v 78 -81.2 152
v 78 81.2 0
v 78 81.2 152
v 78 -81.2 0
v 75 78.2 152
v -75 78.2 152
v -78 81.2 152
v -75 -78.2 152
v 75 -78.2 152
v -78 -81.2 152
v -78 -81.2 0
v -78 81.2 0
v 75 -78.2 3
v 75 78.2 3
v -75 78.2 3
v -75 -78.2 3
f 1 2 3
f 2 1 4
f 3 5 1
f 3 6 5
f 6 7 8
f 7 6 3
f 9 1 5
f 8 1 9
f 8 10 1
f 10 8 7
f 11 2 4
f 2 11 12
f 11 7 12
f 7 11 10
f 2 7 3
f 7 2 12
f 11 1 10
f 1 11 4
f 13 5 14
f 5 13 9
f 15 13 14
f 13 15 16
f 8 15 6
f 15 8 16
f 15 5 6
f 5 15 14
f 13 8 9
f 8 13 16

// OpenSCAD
// file: ../01_bandeja/ribs.scad
//
// ============================================================================
// SteamMachine UM790
// Project Phoenix
//
// Archivo : ribs.scad
// Versión : 8.0
//
// Nervios estructurales de la bandeja.
//
// ============================================================================

include <../../../00_parametros.scad>;

$fn = 64;


//=============================================================================
// NERVIO ENTRE DOS PUNTOS
//=============================================================================

module rib(x1, y1, x2, y2)
{

    dx = x2 - x1;
    dy = y2 - y1;

    len = sqrt(dx*dx + dy*dy);

    angle = atan2(dy, dx);

    translate([x1, y1, tray_thickness])

        rotate([0,0,angle])

            cube(
            [
                len,
                rib_width,
                rib_height
            ]);

}


//=============================================================================
// NERVIOS
//=============================================================================

module ribs()
{

    //---------------------------------------------------------
    // Horizontal superior
    //---------------------------------------------------------

    rib(
        -off_x,
         off_y-rib_width/2,

         off_x,
         off_y-rib_width/2
    );


    //---------------------------------------------------------
    // Horizontal inferior
    //---------------------------------------------------------

    rib(
        -off_x,
        -off_y-rib_width/2,

         off_x,
        -off_y-rib_width/2
    );


    //---------------------------------------------------------
    // Vertical izquierdo
    //---------------------------------------------------------

    translate([-rib_width/2,0,0])

    rib(
        -off_x,
        -off_y,

        -off_x,
         off_y
    );


    //---------------------------------------------------------
    // Vertical derecho
    //---------------------------------------------------------

    translate([-rib_width/2,0,0])

    rib(
         off_x,
        -off_y,

         off_x,
         off_y
    );


    //---------------------------------------------------------
    // Cruz central horizontal
    //---------------------------------------------------------

    rib(
        -off_x,
        -rib_width/2,

         off_x,
        -rib_width/2
    );


    //---------------------------------------------------------
    // Cruz central vertical
    //---------------------------------------------------------

    translate([-rib_width/2,0,0])

    rib(
        0,
        -off_y,

        0,
         off_y
    );

}


//=============================================================================
// PREVIEW
//=============================================================================

color("RoyalBlue")
ribs();
// file: ../01_bandeja/posts.scad
//
// ============================================================================
// SteamMachine UM790
// Project Phoenix
//
// Archivo : posts.scad
// Versión : 8.0
//
// Postes de fijación UM790 Pro.
//
// ============================================================================

include <../../../00_parametros.scad>;

$fn = 64;


//=============================================================================
// POSTE M3
//=============================================================================

module post()
{

    difference()
    {

        //---------------------------------------------------------------------
        // Cuerpo del poste
        //---------------------------------------------------------------------

        cylinder(
            h = um790_post_height,
            d = um790_post_diameter
        );

        //---------------------------------------------------------------------
        // Alojamiento del inserto M3
        //---------------------------------------------------------------------

        translate([0,0,um790_post_height-insert_depth])

            cylinder(
                h = insert_depth + 0.10,
                d = insert_diameter
            );

    }

}


//=============================================================================
// CONJUNTO DE POSTES
//=============================================================================

module posts()
{

    translate([ off_x,  off_y, 0]) post();

    translate([-off_x,  off_y, 0]) post();

    translate([-off_x, -off_y, 0]) post();

    translate([ off_x, -off_y, 0]) post();

}


//=============================================================================
// PREVIEW
//=============================================================================

color("Orange")
posts();
// file: ../01_bandeja/base.scad
//
// ============================================================================
// SteamMachine UM790
// Project Phoenix
//
// Archivo : base.scad
// Versión : 8.0
//
// Base estructural de la bandeja.
//
// ============================================================================

include <../../../00_parametros.scad>;

$fn = 64;

//=============================================================================
// BASE
//=============================================================================

module base()
{

    union()
    {

        //---------------------------------------------------------------------
        // Marco exterior
        //---------------------------------------------------------------------

        difference()
        {

            translate([
                -tray_width/2,
                -tray_depth/2,
                0
            ])
            cube([
                tray_width,
                tray_depth,
                tray_thickness
            ]);


            translate([
                -(tray_width-2*base_frame_width)/2,
                -(tray_depth-2*base_frame_width)/2,
                -0.1
            ])
            cube([
                tray_width-2*base_frame_width,
                tray_depth-2*base_frame_width,
                tray_thickness+0.2
            ]);

        }


        //---------------------------------------------------------------------
        // Islas de apoyo de los postes
        //---------------------------------------------------------------------

        for(ix=[-1,1])
        for(iy=[-1,1])
        {

            translate([
                ix*off_x-base_island_size/2,
                iy*off_y-base_island_size/2,
                0
            ])
            cube([
                base_island_size,
                base_island_size,
                tray_thickness
            ]);

        }


        //---------------------------------------------------------------------
        // Refuerzo horizontal
        //---------------------------------------------------------------------

        translate([
            -off_x,
            -base_bridge_width/2,
            0
        ])
        cube([
            off_x*2,
            base_bridge_width,
            tray_thickness
        ]);


        //---------------------------------------------------------------------
        // Refuerzo vertical
        //---------------------------------------------------------------------

        translate([
            -base_bridge_width/2,
            -off_y,
            0
        ])
        cube([
            base_bridge_width,
            off_y*2,
            tray_thickness
        ]);

    }

}


//=============================================================================
// PREVIEW
//=============================================================================

color("Gainsboro")
    base();
// file: ../01_bandeja/tray.scad
//
// ============================================================================
// SteamMachine UM790
// Project Phoenix
//
// Archivo : tray.scad
// Versión : 8.0
//
// Ensamblaje completo de la bandeja estructural.
//
// ============================================================================

include <../../../00_parametros.scad>;

use <base.scad>;
use <posts.scad>;
use <ribs.scad>;

$fn = 64;


//=============================================================================
// BANDEJA COMPLETA
//=============================================================================

module tray()
{

    union()
    {

        //---------------------------------------------------------------------
        // Base
        //---------------------------------------------------------------------

        base();


        //---------------------------------------------------------------------
        // Postes
        //---------------------------------------------------------------------

        translate([0,0,tray_thickness])
            posts();


        //---------------------------------------------------------------------
        // Nervios
        //---------------------------------------------------------------------

        ribs();

    }

}


//=============================================================================
// PREVIEW
//=============================================================================

color("LightGray")
    tray();
// file: ../../../00_parametros.scad
//
// ============================================================================
// SteamMachine UM790
// Project Phoenix
//
// Archivo : 00_parametros.scad
// Versión : 2.1
//
// ÚNICA fuente de parámetros del proyecto.
//
// NO añadir parámetros duplicados en otros archivos.
//
// ============================================================================

$fn = 64;

//=============================================================================
// INFORMACIÓN
//=============================================================================

project_name    = "SteamMachine UM790";
project_version = "2.1";


//=============================================================================
// CARCASA
//=============================================================================

case_width  = 156.0;
case_depth  = 162.4;
case_height = 152.0;

wall_thickness   = 3.0;
top_thickness    = 3.0;
bottom_thickness = 3.0;


//=============================================================================
// BANDEJA
//=============================================================================

tray_width      = 150.0;
tray_depth      = 150.0;
tray_thickness  = 3.0;

base_frame_width    = 10.0;

base_outer_chamfer  = 4.0;
base_inner_chamfer  = 4.0;


//=============================================================================
// REFUERZOS BASE
//=============================================================================

base_island_size  = 20.0;
base_bridge_width = 10.0;


//=============================================================================
// PCB UM790
//=============================================================================

pcb_width      = 122.0;
pcb_depth      = 119.5;
pcb_thickness  = 1.60;


//=============================================================================
// FIJACIÓN UM790
//=============================================================================

um790_mount_spacing_x = 113.0;
um790_mount_spacing_y = 99.0;


//=============================================================================
// POSTES
//=============================================================================

um790_post_height   = 6.0;
um790_post_diameter = 7.0;

insert_diameter = 4.10;
insert_depth    = 5.00;


//=============================================================================
// DERIVADOS
//=============================================================================

off_x = um790_mount_spacing_x / 2;
off_y = um790_mount_spacing_y / 2;


//=============================================================================
// NERVIOS
//=============================================================================

rib_width  = 3.0;
rib_height = 5.0;


//=============================================================================
// VENTILACIÓN
//=============================================================================

vent_slot_width  = 4.0;
vent_slot_length = 40.0;
vent_spacing     = 8.0;


//=============================================================================
// IMANES
//=============================================================================

magnet_diameter = 8.0;
magnet_height   = 3.0;


//=============================================================================
// TORNILLERÍA
//=============================================================================

mount_hole = 3.40;


//=============================================================================
// COMPATIBILIDAD CON VERSIONES ANTERIORES
//=============================================================================

// PCB

pcb_x = pcb_width;
pcb_y = pcb_depth;

// Distancia entre agujeros

hole_dist_x = um790_mount_spacing_x;
hole_dist_y = um790_mount_spacing_y;

// Postes

standoff_height = um790_post_height;
standoff_dia    = um790_post_diameter;

// Insertos

insert_dia   = insert_diameter;
// insert_depth = insert_depth;

// Base

base_thickness = tray_thickness;
// main file
//
// ============================================================================
// SteamMachine UM790
// Project Phoenix
//
// Archivo : chassis_lower.scad
// Versión : 1.0
//
// Chasis inferior.
//
// ============================================================================

include <../../../00_parametros.scad>;

use <../01_bandeja/tray.scad>;

$fn = 64;


//=============================================================================
// PARÁMETROS DEL CHASIS
//=============================================================================

air_gap = 12;

support_diameter = 20;
support_height   = air_gap;

floor_rib_width  = 3;
floor_rib_height = 6;


//=============================================================================
// FONDO DEL CHASIS
//=============================================================================

module chassis_floor()
{

    cube(
    [
        case_width,
        case_depth,
        bottom_thickness
    ]);

}


//=============================================================================
// CONTORNO EXTERIOR
//=============================================================================

module chassis_outline()
{

    difference()
    {

        cube(
        [
            case_width,
            case_depth,
            case_height
        ]);


        translate(
        [
            wall_thickness,
            wall_thickness,
            bottom_thickness
        ])

        cube(
        [
            case_width-(wall_thickness*2),
            case_depth-(wall_thickness*2),
            case_height
        ]);

    }

}


//=============================================================================
// BASE DEL CHASIS
//=============================================================================

module chassis_lower()
{

    union()
    {

        //-----------------------------------------------------------------
        // Fondo
        //-----------------------------------------------------------------

        chassis_floor();


        //-----------------------------------------------------------------
        // Paredes exteriores
        //-----------------------------------------------------------------

        chassis_outline();

    }

}


//=============================================================================
// PREVIEW
//=============================================================================

translate(
[
    -case_width/2,
    -case_depth/2,
    0
])

color("Gainsboro")

    chassis_lower();
